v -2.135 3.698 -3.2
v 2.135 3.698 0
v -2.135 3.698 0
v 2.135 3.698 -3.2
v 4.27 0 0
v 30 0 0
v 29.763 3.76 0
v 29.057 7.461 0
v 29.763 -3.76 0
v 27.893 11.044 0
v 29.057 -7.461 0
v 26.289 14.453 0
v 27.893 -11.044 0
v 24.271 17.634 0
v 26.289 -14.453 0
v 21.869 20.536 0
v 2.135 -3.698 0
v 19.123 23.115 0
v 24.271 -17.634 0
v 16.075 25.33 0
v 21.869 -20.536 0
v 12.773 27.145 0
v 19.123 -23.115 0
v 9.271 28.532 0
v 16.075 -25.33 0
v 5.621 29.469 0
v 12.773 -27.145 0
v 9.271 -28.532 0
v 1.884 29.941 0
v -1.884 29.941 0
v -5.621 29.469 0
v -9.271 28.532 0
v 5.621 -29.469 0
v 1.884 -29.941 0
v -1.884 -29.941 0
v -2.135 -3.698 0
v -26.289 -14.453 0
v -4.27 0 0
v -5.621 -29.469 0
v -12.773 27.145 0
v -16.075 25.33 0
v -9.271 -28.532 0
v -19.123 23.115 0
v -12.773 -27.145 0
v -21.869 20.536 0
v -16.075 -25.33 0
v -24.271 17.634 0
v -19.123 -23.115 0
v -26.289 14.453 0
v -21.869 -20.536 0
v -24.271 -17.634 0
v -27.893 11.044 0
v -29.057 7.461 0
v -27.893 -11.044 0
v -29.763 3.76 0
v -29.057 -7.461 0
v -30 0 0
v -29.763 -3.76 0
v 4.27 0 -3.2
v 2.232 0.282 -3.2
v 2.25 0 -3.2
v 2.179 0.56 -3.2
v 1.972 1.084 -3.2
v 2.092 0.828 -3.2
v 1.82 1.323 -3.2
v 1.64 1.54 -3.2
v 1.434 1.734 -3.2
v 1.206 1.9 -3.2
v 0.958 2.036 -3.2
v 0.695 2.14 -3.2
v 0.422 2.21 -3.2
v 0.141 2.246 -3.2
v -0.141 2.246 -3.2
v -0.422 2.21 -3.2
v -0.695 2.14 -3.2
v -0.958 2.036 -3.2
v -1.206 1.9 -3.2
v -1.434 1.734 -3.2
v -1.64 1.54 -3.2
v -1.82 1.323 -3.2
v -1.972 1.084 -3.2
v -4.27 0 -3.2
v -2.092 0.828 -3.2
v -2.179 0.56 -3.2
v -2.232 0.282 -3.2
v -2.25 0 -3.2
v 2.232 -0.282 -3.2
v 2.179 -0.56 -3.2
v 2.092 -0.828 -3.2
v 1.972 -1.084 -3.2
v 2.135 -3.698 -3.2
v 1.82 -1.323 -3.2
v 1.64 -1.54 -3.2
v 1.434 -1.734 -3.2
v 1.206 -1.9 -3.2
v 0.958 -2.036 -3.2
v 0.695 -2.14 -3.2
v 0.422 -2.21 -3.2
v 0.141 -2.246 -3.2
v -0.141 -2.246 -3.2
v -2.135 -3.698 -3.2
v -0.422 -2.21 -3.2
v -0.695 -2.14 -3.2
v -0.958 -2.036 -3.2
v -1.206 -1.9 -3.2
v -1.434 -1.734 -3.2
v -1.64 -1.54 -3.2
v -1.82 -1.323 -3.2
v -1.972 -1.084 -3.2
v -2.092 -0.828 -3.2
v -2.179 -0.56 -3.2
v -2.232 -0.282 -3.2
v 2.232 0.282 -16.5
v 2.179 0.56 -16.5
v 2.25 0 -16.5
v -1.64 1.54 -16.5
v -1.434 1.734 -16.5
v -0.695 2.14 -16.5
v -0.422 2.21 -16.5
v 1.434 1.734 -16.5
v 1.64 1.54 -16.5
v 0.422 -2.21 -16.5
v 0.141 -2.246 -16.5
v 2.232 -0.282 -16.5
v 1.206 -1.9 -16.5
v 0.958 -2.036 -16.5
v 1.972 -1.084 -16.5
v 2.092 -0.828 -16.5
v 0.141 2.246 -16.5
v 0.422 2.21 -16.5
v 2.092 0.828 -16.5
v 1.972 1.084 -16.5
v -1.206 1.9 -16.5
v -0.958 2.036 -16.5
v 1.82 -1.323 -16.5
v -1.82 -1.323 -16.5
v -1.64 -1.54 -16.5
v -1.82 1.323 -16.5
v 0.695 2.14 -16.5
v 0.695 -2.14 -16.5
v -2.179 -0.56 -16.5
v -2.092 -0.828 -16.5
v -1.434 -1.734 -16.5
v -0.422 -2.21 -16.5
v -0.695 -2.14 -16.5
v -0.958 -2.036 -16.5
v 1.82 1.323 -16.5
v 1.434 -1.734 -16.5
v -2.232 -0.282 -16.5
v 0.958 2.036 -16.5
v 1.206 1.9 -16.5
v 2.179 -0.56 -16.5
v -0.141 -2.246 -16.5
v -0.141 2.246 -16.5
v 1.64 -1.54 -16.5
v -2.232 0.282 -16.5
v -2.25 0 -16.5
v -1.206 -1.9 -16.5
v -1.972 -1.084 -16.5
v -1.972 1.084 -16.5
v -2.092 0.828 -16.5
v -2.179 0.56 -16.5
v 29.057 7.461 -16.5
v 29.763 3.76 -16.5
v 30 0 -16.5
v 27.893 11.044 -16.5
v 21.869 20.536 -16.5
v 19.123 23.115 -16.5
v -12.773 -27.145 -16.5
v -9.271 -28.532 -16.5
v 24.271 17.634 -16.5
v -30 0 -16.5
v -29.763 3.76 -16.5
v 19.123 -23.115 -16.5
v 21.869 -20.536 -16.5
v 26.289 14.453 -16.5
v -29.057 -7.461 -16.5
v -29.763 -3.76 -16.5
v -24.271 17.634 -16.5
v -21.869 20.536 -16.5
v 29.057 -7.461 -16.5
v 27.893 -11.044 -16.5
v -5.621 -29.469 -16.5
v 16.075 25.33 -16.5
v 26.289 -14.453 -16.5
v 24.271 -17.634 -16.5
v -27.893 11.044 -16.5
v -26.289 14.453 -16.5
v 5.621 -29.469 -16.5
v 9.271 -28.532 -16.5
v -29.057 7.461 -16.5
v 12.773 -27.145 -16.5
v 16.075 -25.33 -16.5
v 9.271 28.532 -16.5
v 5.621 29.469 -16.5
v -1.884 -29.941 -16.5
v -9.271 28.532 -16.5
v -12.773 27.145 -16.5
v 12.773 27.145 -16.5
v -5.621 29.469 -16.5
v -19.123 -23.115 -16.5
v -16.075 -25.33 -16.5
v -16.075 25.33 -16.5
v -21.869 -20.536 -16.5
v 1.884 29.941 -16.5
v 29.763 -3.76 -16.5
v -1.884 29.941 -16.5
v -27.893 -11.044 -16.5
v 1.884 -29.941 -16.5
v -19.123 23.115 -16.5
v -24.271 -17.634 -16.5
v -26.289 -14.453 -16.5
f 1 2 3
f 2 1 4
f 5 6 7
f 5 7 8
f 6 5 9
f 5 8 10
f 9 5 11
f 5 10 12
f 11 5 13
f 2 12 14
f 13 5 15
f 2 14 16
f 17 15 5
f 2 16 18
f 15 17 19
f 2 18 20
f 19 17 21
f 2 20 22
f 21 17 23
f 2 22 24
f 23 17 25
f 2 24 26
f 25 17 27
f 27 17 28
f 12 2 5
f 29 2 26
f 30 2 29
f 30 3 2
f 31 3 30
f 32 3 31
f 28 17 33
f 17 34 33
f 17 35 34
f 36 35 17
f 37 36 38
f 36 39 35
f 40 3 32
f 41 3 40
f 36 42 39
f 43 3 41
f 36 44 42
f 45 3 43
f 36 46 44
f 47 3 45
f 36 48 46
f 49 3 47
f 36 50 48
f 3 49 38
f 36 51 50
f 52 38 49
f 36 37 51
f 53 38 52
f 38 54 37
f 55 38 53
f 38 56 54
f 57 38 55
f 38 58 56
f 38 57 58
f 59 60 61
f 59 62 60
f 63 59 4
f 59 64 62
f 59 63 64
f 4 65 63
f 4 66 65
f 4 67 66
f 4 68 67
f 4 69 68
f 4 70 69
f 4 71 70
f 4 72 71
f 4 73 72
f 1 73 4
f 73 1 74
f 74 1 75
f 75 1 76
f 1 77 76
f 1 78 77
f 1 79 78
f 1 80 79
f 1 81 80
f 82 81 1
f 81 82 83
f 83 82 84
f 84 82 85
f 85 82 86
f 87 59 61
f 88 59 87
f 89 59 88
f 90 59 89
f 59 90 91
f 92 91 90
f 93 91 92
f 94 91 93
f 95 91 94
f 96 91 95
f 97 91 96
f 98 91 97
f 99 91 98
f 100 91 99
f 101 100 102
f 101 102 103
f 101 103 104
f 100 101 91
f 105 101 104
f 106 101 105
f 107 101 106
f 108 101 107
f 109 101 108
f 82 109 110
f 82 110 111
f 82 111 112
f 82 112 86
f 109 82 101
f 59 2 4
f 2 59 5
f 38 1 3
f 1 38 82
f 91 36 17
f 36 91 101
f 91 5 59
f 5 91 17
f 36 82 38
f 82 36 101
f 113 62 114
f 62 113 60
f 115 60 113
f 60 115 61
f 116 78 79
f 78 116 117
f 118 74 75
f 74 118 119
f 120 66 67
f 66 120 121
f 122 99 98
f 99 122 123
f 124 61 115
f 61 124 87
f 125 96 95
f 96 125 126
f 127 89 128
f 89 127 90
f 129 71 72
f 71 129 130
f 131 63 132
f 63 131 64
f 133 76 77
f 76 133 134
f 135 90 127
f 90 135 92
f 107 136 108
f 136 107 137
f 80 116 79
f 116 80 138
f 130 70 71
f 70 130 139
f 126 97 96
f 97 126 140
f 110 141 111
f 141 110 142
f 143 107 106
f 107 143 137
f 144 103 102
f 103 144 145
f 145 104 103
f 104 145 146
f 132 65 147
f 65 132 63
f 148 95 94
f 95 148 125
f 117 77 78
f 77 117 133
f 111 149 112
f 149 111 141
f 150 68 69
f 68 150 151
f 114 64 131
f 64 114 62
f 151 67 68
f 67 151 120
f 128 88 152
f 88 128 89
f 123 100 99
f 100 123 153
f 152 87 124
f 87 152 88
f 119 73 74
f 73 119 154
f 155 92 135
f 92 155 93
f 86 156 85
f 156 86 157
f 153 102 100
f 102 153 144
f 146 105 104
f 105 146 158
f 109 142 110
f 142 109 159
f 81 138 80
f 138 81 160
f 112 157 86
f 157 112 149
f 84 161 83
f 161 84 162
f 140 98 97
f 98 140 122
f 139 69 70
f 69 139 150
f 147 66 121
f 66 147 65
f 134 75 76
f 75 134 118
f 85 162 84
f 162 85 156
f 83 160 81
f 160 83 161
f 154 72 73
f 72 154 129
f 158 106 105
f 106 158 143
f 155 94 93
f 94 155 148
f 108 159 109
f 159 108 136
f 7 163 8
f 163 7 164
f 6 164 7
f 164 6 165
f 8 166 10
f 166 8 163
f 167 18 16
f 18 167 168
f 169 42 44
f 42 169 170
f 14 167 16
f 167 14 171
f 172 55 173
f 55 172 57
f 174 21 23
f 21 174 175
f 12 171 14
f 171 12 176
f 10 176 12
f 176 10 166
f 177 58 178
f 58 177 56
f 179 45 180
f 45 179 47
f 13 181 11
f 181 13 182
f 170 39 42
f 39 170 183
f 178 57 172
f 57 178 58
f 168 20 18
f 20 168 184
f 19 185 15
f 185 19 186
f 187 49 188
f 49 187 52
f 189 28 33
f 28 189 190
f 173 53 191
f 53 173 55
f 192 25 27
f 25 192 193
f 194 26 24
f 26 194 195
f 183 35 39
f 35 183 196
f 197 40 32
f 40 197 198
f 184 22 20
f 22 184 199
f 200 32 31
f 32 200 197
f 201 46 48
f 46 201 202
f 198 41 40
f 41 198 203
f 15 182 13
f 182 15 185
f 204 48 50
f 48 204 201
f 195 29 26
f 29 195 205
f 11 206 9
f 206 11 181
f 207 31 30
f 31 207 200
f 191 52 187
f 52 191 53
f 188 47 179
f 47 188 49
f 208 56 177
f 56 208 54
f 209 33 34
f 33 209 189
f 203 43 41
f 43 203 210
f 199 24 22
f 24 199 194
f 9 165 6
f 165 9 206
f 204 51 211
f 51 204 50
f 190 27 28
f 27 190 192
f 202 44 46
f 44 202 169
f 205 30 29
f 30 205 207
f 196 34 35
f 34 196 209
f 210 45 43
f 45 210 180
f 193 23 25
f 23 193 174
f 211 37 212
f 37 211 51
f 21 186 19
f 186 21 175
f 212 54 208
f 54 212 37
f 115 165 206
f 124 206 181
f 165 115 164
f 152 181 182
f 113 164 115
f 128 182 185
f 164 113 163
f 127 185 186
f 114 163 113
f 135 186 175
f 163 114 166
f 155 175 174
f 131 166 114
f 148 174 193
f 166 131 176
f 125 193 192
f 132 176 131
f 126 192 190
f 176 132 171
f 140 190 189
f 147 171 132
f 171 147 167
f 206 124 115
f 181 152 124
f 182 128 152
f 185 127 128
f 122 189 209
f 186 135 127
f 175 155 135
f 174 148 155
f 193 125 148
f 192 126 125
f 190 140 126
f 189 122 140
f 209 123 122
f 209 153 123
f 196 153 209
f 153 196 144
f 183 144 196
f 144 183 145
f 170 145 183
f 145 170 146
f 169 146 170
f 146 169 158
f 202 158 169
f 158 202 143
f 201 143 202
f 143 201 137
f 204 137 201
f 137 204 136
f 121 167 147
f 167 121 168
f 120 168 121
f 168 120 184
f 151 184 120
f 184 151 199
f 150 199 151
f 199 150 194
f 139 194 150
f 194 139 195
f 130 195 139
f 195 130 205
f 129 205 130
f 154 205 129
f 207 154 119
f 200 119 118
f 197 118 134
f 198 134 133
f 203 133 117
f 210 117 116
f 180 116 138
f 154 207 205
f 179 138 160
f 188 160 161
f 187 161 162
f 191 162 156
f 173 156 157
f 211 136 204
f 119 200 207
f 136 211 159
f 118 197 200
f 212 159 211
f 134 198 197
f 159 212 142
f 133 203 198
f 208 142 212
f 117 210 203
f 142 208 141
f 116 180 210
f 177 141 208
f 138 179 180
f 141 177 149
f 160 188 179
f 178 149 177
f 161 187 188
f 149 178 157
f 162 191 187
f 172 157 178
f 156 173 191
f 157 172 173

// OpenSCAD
$fn = 50;


difference() {
	union() {
		translate(v = [0, 0, -16.5000000000]) {
			cylinder(h = 16.5000000000, r = 30.0000000000);
		}
	}
	union() {
		translate(v = [0, 0, 0]) {
			rotate(a = [0, 0, 0]) {
				difference() {
					union() {
						translate(v = [0, 0, -3.2000000000]) {
							linear_extrude(height = 3.2000000000) {
								polygon(points = [[4.2698000000, 0.0000000000], [2.1349000000, 3.6977552691], [-2.1349000000, 3.6977552691], [-4.2698000000, 0.0000000000], [-2.1349000000, -3.6977552691], [2.1349000000, -3.6977552691]]);
							}
						}
					}
					union();
				}
			}
		}
		#translate(v = [0, 0, -100.0000000000]) {
			cylinder(h = 200, r = 2.2500000000);
		}
	}
}
